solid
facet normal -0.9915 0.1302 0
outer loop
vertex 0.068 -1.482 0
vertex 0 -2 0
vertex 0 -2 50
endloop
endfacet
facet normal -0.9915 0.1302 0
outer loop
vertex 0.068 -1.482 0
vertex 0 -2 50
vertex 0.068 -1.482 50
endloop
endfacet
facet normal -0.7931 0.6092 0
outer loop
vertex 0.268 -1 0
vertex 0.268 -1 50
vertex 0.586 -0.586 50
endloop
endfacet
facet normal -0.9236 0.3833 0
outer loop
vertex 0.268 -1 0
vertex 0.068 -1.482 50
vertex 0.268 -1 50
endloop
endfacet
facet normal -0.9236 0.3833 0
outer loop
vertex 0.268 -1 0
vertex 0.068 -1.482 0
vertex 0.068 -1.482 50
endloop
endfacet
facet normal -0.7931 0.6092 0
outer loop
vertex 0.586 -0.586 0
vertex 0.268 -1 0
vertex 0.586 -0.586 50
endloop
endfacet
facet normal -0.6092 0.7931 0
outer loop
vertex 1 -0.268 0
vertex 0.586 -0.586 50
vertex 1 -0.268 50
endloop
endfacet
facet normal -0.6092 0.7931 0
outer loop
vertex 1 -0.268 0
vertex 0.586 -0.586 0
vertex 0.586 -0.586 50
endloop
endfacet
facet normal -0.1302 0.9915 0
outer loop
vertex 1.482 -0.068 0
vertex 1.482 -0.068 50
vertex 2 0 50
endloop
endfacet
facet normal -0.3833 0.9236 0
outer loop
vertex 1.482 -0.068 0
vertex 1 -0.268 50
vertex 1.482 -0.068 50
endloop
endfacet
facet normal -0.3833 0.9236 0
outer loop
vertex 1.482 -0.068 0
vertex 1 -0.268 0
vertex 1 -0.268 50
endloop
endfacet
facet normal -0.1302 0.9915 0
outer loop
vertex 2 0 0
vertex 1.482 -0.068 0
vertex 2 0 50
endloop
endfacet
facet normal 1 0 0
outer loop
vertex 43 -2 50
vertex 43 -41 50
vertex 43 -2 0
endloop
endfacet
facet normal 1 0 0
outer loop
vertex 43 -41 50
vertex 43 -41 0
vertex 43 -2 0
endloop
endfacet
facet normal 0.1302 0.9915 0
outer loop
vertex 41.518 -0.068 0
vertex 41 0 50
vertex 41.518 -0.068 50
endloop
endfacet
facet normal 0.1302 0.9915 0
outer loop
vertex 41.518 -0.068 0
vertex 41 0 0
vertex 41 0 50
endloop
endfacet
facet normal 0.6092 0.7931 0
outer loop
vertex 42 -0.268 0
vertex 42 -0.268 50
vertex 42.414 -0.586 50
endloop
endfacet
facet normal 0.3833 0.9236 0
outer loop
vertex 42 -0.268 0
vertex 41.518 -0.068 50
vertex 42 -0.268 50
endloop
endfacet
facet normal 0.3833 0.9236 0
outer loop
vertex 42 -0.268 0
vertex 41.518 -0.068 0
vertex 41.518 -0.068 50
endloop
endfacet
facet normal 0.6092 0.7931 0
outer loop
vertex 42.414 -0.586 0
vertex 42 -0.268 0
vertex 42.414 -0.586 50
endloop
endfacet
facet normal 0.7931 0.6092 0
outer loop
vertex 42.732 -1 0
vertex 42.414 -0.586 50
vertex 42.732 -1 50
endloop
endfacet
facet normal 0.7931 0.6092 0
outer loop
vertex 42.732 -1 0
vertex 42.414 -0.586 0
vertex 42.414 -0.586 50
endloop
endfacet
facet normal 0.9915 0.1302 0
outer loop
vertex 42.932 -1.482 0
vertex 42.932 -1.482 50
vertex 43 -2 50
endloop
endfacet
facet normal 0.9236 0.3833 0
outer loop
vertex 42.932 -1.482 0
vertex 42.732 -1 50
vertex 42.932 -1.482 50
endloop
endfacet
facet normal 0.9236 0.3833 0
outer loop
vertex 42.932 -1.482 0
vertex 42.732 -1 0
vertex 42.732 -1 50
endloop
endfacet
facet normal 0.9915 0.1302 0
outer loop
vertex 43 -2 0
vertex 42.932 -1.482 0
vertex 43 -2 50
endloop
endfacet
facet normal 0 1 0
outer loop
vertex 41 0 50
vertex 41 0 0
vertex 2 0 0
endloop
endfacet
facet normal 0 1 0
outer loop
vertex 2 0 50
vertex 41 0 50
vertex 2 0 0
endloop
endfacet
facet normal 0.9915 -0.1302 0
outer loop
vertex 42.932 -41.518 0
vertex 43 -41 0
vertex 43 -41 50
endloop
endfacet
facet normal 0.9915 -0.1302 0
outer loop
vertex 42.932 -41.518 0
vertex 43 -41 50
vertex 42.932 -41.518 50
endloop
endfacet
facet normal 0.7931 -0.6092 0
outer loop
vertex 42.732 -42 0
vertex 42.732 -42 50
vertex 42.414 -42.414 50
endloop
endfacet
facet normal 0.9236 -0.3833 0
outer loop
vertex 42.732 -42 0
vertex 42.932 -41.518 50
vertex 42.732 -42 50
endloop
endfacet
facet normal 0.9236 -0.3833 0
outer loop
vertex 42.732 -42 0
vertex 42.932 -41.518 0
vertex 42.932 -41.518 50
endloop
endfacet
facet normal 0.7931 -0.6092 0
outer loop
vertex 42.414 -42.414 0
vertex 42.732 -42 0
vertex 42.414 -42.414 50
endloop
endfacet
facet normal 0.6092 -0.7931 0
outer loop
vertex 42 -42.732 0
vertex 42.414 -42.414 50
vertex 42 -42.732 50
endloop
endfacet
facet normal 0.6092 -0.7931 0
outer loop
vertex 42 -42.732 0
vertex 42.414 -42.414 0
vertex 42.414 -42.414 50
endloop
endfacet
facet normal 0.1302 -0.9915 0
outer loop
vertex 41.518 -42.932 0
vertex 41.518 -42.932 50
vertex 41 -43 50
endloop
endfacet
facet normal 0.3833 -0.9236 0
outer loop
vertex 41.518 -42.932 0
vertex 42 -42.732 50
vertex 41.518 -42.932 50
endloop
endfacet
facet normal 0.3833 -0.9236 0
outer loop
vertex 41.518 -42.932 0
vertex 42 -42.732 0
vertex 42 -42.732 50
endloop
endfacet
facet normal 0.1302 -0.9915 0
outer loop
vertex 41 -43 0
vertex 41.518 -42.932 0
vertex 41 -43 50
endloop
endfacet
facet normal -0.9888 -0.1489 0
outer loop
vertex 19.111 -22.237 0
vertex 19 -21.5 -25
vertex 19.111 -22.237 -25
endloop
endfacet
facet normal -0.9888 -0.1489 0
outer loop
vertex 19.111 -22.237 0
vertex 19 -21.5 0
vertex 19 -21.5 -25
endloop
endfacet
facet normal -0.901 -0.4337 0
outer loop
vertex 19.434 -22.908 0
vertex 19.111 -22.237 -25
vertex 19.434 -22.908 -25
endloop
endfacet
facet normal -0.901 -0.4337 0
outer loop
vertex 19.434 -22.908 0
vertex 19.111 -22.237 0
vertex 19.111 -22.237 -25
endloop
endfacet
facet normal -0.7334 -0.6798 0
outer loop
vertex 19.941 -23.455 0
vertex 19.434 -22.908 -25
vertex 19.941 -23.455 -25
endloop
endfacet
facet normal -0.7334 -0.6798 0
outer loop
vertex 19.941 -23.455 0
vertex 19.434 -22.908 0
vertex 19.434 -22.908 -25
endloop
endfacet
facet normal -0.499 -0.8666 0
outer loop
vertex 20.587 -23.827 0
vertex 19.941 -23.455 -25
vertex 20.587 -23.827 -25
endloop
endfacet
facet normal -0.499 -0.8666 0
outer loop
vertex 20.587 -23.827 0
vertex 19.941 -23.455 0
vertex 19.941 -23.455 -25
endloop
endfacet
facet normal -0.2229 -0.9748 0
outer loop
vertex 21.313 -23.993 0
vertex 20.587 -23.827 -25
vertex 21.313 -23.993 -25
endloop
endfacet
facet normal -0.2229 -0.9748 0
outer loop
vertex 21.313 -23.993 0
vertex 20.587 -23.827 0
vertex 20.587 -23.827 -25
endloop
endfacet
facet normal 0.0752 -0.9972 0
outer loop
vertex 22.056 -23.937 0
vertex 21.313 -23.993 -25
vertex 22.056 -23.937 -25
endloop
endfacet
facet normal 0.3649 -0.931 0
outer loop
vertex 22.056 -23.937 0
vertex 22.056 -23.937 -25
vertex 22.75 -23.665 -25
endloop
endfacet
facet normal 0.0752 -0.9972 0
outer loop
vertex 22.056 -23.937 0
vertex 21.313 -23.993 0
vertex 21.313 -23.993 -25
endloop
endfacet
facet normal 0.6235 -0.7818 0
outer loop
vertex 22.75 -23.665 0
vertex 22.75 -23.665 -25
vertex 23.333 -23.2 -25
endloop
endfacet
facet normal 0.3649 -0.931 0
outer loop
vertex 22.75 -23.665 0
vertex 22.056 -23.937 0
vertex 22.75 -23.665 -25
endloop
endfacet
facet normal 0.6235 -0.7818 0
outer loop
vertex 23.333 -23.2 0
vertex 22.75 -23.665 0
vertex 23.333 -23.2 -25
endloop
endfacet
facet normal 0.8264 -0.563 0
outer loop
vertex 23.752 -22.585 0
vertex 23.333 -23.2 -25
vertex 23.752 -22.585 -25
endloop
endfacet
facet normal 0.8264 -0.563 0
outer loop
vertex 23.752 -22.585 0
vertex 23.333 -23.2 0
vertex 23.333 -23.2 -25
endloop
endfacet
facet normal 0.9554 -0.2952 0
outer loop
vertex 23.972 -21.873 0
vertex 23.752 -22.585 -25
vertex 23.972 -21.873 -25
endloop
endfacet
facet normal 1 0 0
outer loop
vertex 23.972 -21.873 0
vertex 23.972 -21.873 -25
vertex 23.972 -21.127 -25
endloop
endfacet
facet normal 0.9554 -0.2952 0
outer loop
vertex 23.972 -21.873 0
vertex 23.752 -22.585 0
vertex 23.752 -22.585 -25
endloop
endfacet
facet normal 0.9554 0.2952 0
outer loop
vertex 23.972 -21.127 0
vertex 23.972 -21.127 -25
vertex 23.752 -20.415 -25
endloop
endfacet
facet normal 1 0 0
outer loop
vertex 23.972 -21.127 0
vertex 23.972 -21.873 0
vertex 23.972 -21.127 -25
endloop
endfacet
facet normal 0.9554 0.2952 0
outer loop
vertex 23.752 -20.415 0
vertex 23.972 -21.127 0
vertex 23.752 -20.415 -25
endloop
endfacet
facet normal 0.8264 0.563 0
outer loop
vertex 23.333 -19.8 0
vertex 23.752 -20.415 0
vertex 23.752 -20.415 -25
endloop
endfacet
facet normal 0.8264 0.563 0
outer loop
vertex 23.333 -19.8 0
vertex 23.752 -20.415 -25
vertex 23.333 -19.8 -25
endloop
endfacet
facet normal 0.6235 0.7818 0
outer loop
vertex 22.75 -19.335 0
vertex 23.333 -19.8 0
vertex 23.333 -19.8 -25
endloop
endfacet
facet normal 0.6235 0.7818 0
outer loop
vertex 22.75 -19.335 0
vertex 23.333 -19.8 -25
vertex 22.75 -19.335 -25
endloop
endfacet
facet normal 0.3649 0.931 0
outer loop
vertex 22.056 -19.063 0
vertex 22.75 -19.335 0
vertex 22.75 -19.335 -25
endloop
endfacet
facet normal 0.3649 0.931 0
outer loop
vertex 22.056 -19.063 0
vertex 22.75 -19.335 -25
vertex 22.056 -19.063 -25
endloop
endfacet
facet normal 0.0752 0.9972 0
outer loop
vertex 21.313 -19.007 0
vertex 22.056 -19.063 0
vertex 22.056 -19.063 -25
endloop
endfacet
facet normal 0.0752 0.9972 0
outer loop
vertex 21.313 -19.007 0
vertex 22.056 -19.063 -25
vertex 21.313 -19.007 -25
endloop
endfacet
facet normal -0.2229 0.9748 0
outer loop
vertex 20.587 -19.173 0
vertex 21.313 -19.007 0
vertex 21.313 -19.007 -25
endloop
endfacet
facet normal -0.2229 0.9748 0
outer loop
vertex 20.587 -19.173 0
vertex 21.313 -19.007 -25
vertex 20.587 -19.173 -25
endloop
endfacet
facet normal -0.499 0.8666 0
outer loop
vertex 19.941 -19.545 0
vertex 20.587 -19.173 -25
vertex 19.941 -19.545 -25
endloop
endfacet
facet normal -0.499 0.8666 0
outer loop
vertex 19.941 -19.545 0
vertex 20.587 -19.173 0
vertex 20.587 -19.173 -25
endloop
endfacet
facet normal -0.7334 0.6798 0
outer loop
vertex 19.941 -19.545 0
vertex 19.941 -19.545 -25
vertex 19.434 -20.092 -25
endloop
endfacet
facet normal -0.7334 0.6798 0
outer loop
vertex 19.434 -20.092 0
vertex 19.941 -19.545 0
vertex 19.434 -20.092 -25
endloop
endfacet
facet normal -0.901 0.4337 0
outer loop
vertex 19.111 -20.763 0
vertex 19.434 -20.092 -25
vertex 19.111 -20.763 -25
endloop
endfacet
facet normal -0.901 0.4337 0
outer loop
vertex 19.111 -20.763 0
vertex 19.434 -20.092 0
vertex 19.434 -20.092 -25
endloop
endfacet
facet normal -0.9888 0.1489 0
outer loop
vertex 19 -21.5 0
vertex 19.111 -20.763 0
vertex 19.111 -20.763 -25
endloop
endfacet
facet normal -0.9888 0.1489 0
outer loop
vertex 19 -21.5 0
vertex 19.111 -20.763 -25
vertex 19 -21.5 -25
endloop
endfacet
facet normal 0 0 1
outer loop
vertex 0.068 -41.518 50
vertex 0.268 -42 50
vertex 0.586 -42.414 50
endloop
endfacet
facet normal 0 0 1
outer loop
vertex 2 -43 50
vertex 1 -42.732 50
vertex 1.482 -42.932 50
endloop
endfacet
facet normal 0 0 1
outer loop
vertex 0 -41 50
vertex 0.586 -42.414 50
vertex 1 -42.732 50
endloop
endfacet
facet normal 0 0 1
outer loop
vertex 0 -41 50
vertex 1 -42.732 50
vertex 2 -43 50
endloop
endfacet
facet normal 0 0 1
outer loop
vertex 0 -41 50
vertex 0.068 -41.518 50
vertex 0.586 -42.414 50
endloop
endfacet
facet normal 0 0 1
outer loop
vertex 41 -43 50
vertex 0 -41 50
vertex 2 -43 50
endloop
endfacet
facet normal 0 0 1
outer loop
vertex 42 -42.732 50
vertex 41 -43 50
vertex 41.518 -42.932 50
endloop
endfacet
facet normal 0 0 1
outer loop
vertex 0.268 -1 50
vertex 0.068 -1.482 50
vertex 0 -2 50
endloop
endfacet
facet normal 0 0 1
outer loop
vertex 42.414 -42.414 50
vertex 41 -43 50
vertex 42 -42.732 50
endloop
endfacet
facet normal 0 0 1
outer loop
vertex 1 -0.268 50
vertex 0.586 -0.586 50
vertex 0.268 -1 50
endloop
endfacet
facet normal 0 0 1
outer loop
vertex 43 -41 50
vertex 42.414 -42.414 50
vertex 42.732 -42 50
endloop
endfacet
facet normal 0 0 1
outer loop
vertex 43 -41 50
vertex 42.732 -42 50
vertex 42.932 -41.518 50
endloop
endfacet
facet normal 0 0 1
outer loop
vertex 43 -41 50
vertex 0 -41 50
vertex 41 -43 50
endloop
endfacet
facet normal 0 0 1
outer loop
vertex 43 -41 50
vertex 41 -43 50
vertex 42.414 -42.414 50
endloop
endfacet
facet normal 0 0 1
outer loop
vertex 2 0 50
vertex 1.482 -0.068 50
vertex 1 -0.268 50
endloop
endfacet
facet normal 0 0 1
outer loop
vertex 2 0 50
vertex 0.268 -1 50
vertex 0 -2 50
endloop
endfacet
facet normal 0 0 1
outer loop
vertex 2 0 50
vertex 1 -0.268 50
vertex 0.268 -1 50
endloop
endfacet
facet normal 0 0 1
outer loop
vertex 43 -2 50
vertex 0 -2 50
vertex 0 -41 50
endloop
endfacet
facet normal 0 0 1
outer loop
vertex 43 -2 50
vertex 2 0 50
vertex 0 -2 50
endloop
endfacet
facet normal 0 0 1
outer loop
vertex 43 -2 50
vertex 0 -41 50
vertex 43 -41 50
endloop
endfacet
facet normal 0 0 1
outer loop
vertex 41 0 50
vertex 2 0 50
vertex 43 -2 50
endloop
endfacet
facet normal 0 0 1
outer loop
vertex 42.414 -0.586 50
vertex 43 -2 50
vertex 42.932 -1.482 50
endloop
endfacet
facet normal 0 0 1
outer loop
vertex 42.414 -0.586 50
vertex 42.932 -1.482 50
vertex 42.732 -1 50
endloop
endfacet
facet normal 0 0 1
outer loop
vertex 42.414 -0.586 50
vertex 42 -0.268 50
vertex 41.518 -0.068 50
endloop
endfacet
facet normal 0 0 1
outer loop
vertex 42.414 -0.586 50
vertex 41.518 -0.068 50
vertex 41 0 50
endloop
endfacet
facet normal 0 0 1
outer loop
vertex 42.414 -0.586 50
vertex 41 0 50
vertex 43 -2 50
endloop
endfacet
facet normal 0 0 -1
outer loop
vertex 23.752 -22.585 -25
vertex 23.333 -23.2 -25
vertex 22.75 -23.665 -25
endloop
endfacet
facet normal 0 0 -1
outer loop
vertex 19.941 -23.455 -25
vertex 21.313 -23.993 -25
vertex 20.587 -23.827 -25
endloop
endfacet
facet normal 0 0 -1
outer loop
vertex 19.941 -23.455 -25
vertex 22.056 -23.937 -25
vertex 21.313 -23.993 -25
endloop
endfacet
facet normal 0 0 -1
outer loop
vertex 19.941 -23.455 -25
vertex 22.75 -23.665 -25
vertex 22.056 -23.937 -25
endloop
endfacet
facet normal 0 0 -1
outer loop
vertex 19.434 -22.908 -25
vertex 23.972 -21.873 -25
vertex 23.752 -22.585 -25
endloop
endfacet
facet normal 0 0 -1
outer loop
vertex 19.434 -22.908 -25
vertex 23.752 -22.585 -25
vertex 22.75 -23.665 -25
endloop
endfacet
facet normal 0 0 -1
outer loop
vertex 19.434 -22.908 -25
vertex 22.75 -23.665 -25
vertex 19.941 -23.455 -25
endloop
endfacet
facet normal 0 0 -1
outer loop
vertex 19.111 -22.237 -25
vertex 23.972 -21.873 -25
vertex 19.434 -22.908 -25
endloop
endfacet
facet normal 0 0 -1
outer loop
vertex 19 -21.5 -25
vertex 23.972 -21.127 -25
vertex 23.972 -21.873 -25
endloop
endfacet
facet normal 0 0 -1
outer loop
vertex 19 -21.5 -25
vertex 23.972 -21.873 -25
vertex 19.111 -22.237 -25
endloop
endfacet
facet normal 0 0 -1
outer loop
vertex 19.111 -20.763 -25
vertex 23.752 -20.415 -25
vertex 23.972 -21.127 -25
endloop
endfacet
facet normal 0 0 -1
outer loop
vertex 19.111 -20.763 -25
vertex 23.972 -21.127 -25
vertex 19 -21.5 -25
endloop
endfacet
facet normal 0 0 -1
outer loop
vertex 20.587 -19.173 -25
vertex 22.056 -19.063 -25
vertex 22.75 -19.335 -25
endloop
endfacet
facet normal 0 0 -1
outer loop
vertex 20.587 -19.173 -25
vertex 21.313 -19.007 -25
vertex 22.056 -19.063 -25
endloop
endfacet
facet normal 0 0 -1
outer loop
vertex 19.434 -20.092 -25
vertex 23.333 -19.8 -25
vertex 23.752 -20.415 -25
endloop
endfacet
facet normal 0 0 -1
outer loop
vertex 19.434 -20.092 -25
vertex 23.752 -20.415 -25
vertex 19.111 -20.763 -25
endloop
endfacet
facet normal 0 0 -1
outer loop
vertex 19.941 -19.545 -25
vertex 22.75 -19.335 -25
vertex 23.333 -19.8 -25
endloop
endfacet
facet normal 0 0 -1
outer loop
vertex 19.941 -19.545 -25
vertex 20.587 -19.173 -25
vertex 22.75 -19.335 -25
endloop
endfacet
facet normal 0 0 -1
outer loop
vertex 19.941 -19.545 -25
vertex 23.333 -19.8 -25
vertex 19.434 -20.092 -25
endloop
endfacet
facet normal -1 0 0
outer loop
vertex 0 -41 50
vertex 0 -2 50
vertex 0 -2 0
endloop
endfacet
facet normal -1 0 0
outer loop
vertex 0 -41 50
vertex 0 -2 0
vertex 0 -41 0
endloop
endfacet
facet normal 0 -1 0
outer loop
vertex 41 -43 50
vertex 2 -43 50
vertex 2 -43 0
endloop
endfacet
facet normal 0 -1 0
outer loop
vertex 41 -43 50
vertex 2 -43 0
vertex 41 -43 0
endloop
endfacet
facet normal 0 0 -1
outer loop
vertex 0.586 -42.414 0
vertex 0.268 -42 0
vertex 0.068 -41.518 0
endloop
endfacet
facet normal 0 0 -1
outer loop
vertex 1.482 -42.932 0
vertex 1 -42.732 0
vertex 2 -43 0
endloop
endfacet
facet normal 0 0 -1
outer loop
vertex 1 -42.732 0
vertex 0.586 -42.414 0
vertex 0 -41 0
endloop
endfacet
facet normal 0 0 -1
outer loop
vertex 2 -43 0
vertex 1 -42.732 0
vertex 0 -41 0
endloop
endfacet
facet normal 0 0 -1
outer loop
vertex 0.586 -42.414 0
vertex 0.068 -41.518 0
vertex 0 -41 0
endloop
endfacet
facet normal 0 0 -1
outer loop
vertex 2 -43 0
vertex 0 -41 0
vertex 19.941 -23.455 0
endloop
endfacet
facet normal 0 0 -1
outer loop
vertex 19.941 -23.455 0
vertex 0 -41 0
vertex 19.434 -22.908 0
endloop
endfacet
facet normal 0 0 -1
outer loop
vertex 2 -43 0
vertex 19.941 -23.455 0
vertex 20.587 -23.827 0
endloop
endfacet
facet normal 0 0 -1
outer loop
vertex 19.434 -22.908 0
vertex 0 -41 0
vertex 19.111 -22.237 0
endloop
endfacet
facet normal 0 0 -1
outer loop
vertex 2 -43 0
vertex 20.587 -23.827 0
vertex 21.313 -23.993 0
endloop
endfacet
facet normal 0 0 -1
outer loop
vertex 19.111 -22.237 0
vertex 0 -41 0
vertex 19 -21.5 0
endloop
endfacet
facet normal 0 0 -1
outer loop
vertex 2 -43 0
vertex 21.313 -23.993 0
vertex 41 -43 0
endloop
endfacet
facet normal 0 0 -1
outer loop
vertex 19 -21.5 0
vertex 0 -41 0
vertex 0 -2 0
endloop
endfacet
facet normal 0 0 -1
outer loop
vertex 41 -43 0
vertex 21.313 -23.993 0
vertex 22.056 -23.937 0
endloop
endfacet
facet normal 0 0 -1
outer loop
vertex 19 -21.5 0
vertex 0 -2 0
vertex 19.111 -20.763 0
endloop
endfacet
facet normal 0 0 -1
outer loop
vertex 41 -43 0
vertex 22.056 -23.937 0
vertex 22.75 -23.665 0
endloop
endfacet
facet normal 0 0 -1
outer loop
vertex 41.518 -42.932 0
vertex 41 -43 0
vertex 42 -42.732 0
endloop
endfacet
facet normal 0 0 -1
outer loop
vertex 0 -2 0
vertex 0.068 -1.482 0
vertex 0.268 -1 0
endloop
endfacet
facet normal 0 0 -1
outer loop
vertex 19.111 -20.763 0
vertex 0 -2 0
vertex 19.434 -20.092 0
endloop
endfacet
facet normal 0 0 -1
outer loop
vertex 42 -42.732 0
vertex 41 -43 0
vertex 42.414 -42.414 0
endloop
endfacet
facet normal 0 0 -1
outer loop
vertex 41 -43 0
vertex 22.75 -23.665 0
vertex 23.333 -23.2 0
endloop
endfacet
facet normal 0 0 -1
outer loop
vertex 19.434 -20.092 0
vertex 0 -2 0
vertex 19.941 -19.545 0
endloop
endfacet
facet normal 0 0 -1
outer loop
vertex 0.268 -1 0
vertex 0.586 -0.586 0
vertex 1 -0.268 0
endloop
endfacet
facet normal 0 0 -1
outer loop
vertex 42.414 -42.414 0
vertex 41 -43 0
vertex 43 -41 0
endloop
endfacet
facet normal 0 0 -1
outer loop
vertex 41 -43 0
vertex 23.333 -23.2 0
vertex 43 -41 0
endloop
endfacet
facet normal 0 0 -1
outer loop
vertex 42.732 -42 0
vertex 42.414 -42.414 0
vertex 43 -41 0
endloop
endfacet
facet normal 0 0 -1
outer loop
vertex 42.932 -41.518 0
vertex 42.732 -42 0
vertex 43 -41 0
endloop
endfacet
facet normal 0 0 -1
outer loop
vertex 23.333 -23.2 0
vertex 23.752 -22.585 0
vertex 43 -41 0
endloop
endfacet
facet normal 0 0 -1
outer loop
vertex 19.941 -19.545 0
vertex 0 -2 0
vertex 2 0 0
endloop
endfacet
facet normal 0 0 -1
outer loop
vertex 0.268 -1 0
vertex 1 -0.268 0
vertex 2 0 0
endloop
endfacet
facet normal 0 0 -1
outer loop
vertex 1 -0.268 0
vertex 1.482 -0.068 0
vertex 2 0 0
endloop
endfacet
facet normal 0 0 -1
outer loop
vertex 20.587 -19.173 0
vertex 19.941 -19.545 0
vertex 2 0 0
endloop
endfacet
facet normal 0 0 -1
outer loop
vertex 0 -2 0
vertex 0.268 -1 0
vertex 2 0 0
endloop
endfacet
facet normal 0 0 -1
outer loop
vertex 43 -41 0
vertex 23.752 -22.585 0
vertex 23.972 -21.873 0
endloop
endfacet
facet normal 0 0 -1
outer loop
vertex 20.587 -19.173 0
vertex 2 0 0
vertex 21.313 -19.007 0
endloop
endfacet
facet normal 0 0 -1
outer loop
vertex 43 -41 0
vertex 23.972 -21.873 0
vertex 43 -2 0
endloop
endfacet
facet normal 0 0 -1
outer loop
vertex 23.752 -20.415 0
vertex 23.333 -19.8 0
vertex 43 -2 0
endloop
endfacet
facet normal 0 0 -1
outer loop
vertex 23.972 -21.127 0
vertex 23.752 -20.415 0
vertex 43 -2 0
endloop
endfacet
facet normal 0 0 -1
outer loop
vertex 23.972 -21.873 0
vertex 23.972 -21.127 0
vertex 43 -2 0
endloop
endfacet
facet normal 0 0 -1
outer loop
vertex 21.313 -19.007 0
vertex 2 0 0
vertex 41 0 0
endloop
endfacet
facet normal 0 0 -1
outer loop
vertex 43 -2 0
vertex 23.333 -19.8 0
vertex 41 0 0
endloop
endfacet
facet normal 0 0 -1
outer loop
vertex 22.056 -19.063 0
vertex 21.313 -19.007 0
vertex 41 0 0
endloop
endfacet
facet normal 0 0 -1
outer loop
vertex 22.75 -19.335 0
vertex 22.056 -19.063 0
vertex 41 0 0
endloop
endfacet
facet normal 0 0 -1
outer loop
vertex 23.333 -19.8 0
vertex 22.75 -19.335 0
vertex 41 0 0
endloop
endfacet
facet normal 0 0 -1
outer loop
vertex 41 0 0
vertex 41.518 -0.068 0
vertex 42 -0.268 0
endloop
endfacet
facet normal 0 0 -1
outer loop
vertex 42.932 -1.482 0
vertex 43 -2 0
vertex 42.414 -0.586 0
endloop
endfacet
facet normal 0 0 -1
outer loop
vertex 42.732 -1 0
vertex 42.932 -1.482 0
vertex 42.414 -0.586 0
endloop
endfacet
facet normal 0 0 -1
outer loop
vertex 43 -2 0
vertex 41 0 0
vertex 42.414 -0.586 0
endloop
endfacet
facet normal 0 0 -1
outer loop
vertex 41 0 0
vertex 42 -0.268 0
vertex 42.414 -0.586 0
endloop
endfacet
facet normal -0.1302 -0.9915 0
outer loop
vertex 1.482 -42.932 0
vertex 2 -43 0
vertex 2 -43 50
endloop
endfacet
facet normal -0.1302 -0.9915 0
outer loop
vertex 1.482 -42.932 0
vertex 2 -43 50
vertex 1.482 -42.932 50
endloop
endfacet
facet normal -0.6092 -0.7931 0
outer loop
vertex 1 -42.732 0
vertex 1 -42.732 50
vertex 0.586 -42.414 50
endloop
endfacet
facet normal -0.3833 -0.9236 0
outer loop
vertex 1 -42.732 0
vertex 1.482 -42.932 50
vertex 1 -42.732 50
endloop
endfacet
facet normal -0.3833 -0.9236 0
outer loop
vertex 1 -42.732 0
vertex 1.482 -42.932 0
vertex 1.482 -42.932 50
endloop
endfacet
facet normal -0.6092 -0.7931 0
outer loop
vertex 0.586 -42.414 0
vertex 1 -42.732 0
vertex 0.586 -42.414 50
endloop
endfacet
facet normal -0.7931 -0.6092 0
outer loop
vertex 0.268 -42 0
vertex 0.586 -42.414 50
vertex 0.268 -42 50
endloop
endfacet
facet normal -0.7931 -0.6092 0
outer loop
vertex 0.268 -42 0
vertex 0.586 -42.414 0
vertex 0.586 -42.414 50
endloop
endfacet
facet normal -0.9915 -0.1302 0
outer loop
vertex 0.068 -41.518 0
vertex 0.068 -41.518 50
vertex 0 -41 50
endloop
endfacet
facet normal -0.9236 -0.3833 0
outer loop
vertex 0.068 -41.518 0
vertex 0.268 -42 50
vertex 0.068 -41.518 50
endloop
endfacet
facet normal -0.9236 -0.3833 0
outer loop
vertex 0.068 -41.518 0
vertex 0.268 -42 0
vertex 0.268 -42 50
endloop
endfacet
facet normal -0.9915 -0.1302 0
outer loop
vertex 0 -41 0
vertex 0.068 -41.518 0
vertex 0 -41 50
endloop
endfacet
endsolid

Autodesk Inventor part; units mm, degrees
ref_plane "YZ Plane" through (0, 0, 0) normal (1, 0, 0) x (0, 1, 0)
ref_plane "XZ Plane" through (0, 0, 0) normal (0, 1, 0) x (-1, 0, 0)
ref_plane "XY Plane" through (0, 0, 0) normal (0, 0, 1) x (1, 0, 0)
sketch "Sketch1" plane through (0, 0, 0) normal (0, 0, 1) x (1, 0, 0)
  line L0 (0, -2) -> (0, -41)
  line L1 (2, -43) -> (41, -43)
  line L2 (43, -41) -> (43, -2)
  line L3 (41, 0) -> (2, 0)
  arc A0 (0, -41) -> (2, -43) centre (2, -41) ccw
  arc A1 (43, -2) -> (41, 0) centre (41, -2) ccw
  arc A2 (2, 0) -> (0, -2) centre (2, -2) ccw
  arc A3 (41, -43) -> (43, -41) centre (41, -41) ccw
  point P0 (0, 0)
  point P1 (0, -43)
  point P2 (43, -43)
  point P3 (43, 0)
  dimension "d0" = 43
  dimension "d1" = 43
  dimension "d7" = 2
extrude "Extrusion1" add sketch "Sketch1" along normal blind 50
sketch "Sketch2" plane through (0, 0, 0) normal (0, 0, -1) x (-1, 0, 0)
  line L0 (-43, -41) -> (-43, -2) projected
  line L1 (-2, -43) -> (-41, -43) projected
  line L2 (-43, 0) -> (0, -43)
  line L3 (0, -43) -> (0, 0)
  line L4 (0, 0) -> (-43, -43)
  circle A0 centre (-21.5, -21.5) radius 2.5
  circle A1 centre (-21.5, -21.5) radius 11
  dimension "d4" = 5
  dimension "d8" = 22
extrude "Extrusion2" add sketch "Sketch2" along normal blind 25 contours A0 L4 L2 | L2 L4 A0 | L4 A0 L2 | L2 A0 L4
ref_plane "Work Plane2" through (21.5, -41, 0) normal (1, 0, 0) x (0, 0, -1)
ref_plane "Work Plane3" through (21.5, -21.5, -25) normal (0, 0, -1) x (-1, 0, 0)
properties part number "motor"
